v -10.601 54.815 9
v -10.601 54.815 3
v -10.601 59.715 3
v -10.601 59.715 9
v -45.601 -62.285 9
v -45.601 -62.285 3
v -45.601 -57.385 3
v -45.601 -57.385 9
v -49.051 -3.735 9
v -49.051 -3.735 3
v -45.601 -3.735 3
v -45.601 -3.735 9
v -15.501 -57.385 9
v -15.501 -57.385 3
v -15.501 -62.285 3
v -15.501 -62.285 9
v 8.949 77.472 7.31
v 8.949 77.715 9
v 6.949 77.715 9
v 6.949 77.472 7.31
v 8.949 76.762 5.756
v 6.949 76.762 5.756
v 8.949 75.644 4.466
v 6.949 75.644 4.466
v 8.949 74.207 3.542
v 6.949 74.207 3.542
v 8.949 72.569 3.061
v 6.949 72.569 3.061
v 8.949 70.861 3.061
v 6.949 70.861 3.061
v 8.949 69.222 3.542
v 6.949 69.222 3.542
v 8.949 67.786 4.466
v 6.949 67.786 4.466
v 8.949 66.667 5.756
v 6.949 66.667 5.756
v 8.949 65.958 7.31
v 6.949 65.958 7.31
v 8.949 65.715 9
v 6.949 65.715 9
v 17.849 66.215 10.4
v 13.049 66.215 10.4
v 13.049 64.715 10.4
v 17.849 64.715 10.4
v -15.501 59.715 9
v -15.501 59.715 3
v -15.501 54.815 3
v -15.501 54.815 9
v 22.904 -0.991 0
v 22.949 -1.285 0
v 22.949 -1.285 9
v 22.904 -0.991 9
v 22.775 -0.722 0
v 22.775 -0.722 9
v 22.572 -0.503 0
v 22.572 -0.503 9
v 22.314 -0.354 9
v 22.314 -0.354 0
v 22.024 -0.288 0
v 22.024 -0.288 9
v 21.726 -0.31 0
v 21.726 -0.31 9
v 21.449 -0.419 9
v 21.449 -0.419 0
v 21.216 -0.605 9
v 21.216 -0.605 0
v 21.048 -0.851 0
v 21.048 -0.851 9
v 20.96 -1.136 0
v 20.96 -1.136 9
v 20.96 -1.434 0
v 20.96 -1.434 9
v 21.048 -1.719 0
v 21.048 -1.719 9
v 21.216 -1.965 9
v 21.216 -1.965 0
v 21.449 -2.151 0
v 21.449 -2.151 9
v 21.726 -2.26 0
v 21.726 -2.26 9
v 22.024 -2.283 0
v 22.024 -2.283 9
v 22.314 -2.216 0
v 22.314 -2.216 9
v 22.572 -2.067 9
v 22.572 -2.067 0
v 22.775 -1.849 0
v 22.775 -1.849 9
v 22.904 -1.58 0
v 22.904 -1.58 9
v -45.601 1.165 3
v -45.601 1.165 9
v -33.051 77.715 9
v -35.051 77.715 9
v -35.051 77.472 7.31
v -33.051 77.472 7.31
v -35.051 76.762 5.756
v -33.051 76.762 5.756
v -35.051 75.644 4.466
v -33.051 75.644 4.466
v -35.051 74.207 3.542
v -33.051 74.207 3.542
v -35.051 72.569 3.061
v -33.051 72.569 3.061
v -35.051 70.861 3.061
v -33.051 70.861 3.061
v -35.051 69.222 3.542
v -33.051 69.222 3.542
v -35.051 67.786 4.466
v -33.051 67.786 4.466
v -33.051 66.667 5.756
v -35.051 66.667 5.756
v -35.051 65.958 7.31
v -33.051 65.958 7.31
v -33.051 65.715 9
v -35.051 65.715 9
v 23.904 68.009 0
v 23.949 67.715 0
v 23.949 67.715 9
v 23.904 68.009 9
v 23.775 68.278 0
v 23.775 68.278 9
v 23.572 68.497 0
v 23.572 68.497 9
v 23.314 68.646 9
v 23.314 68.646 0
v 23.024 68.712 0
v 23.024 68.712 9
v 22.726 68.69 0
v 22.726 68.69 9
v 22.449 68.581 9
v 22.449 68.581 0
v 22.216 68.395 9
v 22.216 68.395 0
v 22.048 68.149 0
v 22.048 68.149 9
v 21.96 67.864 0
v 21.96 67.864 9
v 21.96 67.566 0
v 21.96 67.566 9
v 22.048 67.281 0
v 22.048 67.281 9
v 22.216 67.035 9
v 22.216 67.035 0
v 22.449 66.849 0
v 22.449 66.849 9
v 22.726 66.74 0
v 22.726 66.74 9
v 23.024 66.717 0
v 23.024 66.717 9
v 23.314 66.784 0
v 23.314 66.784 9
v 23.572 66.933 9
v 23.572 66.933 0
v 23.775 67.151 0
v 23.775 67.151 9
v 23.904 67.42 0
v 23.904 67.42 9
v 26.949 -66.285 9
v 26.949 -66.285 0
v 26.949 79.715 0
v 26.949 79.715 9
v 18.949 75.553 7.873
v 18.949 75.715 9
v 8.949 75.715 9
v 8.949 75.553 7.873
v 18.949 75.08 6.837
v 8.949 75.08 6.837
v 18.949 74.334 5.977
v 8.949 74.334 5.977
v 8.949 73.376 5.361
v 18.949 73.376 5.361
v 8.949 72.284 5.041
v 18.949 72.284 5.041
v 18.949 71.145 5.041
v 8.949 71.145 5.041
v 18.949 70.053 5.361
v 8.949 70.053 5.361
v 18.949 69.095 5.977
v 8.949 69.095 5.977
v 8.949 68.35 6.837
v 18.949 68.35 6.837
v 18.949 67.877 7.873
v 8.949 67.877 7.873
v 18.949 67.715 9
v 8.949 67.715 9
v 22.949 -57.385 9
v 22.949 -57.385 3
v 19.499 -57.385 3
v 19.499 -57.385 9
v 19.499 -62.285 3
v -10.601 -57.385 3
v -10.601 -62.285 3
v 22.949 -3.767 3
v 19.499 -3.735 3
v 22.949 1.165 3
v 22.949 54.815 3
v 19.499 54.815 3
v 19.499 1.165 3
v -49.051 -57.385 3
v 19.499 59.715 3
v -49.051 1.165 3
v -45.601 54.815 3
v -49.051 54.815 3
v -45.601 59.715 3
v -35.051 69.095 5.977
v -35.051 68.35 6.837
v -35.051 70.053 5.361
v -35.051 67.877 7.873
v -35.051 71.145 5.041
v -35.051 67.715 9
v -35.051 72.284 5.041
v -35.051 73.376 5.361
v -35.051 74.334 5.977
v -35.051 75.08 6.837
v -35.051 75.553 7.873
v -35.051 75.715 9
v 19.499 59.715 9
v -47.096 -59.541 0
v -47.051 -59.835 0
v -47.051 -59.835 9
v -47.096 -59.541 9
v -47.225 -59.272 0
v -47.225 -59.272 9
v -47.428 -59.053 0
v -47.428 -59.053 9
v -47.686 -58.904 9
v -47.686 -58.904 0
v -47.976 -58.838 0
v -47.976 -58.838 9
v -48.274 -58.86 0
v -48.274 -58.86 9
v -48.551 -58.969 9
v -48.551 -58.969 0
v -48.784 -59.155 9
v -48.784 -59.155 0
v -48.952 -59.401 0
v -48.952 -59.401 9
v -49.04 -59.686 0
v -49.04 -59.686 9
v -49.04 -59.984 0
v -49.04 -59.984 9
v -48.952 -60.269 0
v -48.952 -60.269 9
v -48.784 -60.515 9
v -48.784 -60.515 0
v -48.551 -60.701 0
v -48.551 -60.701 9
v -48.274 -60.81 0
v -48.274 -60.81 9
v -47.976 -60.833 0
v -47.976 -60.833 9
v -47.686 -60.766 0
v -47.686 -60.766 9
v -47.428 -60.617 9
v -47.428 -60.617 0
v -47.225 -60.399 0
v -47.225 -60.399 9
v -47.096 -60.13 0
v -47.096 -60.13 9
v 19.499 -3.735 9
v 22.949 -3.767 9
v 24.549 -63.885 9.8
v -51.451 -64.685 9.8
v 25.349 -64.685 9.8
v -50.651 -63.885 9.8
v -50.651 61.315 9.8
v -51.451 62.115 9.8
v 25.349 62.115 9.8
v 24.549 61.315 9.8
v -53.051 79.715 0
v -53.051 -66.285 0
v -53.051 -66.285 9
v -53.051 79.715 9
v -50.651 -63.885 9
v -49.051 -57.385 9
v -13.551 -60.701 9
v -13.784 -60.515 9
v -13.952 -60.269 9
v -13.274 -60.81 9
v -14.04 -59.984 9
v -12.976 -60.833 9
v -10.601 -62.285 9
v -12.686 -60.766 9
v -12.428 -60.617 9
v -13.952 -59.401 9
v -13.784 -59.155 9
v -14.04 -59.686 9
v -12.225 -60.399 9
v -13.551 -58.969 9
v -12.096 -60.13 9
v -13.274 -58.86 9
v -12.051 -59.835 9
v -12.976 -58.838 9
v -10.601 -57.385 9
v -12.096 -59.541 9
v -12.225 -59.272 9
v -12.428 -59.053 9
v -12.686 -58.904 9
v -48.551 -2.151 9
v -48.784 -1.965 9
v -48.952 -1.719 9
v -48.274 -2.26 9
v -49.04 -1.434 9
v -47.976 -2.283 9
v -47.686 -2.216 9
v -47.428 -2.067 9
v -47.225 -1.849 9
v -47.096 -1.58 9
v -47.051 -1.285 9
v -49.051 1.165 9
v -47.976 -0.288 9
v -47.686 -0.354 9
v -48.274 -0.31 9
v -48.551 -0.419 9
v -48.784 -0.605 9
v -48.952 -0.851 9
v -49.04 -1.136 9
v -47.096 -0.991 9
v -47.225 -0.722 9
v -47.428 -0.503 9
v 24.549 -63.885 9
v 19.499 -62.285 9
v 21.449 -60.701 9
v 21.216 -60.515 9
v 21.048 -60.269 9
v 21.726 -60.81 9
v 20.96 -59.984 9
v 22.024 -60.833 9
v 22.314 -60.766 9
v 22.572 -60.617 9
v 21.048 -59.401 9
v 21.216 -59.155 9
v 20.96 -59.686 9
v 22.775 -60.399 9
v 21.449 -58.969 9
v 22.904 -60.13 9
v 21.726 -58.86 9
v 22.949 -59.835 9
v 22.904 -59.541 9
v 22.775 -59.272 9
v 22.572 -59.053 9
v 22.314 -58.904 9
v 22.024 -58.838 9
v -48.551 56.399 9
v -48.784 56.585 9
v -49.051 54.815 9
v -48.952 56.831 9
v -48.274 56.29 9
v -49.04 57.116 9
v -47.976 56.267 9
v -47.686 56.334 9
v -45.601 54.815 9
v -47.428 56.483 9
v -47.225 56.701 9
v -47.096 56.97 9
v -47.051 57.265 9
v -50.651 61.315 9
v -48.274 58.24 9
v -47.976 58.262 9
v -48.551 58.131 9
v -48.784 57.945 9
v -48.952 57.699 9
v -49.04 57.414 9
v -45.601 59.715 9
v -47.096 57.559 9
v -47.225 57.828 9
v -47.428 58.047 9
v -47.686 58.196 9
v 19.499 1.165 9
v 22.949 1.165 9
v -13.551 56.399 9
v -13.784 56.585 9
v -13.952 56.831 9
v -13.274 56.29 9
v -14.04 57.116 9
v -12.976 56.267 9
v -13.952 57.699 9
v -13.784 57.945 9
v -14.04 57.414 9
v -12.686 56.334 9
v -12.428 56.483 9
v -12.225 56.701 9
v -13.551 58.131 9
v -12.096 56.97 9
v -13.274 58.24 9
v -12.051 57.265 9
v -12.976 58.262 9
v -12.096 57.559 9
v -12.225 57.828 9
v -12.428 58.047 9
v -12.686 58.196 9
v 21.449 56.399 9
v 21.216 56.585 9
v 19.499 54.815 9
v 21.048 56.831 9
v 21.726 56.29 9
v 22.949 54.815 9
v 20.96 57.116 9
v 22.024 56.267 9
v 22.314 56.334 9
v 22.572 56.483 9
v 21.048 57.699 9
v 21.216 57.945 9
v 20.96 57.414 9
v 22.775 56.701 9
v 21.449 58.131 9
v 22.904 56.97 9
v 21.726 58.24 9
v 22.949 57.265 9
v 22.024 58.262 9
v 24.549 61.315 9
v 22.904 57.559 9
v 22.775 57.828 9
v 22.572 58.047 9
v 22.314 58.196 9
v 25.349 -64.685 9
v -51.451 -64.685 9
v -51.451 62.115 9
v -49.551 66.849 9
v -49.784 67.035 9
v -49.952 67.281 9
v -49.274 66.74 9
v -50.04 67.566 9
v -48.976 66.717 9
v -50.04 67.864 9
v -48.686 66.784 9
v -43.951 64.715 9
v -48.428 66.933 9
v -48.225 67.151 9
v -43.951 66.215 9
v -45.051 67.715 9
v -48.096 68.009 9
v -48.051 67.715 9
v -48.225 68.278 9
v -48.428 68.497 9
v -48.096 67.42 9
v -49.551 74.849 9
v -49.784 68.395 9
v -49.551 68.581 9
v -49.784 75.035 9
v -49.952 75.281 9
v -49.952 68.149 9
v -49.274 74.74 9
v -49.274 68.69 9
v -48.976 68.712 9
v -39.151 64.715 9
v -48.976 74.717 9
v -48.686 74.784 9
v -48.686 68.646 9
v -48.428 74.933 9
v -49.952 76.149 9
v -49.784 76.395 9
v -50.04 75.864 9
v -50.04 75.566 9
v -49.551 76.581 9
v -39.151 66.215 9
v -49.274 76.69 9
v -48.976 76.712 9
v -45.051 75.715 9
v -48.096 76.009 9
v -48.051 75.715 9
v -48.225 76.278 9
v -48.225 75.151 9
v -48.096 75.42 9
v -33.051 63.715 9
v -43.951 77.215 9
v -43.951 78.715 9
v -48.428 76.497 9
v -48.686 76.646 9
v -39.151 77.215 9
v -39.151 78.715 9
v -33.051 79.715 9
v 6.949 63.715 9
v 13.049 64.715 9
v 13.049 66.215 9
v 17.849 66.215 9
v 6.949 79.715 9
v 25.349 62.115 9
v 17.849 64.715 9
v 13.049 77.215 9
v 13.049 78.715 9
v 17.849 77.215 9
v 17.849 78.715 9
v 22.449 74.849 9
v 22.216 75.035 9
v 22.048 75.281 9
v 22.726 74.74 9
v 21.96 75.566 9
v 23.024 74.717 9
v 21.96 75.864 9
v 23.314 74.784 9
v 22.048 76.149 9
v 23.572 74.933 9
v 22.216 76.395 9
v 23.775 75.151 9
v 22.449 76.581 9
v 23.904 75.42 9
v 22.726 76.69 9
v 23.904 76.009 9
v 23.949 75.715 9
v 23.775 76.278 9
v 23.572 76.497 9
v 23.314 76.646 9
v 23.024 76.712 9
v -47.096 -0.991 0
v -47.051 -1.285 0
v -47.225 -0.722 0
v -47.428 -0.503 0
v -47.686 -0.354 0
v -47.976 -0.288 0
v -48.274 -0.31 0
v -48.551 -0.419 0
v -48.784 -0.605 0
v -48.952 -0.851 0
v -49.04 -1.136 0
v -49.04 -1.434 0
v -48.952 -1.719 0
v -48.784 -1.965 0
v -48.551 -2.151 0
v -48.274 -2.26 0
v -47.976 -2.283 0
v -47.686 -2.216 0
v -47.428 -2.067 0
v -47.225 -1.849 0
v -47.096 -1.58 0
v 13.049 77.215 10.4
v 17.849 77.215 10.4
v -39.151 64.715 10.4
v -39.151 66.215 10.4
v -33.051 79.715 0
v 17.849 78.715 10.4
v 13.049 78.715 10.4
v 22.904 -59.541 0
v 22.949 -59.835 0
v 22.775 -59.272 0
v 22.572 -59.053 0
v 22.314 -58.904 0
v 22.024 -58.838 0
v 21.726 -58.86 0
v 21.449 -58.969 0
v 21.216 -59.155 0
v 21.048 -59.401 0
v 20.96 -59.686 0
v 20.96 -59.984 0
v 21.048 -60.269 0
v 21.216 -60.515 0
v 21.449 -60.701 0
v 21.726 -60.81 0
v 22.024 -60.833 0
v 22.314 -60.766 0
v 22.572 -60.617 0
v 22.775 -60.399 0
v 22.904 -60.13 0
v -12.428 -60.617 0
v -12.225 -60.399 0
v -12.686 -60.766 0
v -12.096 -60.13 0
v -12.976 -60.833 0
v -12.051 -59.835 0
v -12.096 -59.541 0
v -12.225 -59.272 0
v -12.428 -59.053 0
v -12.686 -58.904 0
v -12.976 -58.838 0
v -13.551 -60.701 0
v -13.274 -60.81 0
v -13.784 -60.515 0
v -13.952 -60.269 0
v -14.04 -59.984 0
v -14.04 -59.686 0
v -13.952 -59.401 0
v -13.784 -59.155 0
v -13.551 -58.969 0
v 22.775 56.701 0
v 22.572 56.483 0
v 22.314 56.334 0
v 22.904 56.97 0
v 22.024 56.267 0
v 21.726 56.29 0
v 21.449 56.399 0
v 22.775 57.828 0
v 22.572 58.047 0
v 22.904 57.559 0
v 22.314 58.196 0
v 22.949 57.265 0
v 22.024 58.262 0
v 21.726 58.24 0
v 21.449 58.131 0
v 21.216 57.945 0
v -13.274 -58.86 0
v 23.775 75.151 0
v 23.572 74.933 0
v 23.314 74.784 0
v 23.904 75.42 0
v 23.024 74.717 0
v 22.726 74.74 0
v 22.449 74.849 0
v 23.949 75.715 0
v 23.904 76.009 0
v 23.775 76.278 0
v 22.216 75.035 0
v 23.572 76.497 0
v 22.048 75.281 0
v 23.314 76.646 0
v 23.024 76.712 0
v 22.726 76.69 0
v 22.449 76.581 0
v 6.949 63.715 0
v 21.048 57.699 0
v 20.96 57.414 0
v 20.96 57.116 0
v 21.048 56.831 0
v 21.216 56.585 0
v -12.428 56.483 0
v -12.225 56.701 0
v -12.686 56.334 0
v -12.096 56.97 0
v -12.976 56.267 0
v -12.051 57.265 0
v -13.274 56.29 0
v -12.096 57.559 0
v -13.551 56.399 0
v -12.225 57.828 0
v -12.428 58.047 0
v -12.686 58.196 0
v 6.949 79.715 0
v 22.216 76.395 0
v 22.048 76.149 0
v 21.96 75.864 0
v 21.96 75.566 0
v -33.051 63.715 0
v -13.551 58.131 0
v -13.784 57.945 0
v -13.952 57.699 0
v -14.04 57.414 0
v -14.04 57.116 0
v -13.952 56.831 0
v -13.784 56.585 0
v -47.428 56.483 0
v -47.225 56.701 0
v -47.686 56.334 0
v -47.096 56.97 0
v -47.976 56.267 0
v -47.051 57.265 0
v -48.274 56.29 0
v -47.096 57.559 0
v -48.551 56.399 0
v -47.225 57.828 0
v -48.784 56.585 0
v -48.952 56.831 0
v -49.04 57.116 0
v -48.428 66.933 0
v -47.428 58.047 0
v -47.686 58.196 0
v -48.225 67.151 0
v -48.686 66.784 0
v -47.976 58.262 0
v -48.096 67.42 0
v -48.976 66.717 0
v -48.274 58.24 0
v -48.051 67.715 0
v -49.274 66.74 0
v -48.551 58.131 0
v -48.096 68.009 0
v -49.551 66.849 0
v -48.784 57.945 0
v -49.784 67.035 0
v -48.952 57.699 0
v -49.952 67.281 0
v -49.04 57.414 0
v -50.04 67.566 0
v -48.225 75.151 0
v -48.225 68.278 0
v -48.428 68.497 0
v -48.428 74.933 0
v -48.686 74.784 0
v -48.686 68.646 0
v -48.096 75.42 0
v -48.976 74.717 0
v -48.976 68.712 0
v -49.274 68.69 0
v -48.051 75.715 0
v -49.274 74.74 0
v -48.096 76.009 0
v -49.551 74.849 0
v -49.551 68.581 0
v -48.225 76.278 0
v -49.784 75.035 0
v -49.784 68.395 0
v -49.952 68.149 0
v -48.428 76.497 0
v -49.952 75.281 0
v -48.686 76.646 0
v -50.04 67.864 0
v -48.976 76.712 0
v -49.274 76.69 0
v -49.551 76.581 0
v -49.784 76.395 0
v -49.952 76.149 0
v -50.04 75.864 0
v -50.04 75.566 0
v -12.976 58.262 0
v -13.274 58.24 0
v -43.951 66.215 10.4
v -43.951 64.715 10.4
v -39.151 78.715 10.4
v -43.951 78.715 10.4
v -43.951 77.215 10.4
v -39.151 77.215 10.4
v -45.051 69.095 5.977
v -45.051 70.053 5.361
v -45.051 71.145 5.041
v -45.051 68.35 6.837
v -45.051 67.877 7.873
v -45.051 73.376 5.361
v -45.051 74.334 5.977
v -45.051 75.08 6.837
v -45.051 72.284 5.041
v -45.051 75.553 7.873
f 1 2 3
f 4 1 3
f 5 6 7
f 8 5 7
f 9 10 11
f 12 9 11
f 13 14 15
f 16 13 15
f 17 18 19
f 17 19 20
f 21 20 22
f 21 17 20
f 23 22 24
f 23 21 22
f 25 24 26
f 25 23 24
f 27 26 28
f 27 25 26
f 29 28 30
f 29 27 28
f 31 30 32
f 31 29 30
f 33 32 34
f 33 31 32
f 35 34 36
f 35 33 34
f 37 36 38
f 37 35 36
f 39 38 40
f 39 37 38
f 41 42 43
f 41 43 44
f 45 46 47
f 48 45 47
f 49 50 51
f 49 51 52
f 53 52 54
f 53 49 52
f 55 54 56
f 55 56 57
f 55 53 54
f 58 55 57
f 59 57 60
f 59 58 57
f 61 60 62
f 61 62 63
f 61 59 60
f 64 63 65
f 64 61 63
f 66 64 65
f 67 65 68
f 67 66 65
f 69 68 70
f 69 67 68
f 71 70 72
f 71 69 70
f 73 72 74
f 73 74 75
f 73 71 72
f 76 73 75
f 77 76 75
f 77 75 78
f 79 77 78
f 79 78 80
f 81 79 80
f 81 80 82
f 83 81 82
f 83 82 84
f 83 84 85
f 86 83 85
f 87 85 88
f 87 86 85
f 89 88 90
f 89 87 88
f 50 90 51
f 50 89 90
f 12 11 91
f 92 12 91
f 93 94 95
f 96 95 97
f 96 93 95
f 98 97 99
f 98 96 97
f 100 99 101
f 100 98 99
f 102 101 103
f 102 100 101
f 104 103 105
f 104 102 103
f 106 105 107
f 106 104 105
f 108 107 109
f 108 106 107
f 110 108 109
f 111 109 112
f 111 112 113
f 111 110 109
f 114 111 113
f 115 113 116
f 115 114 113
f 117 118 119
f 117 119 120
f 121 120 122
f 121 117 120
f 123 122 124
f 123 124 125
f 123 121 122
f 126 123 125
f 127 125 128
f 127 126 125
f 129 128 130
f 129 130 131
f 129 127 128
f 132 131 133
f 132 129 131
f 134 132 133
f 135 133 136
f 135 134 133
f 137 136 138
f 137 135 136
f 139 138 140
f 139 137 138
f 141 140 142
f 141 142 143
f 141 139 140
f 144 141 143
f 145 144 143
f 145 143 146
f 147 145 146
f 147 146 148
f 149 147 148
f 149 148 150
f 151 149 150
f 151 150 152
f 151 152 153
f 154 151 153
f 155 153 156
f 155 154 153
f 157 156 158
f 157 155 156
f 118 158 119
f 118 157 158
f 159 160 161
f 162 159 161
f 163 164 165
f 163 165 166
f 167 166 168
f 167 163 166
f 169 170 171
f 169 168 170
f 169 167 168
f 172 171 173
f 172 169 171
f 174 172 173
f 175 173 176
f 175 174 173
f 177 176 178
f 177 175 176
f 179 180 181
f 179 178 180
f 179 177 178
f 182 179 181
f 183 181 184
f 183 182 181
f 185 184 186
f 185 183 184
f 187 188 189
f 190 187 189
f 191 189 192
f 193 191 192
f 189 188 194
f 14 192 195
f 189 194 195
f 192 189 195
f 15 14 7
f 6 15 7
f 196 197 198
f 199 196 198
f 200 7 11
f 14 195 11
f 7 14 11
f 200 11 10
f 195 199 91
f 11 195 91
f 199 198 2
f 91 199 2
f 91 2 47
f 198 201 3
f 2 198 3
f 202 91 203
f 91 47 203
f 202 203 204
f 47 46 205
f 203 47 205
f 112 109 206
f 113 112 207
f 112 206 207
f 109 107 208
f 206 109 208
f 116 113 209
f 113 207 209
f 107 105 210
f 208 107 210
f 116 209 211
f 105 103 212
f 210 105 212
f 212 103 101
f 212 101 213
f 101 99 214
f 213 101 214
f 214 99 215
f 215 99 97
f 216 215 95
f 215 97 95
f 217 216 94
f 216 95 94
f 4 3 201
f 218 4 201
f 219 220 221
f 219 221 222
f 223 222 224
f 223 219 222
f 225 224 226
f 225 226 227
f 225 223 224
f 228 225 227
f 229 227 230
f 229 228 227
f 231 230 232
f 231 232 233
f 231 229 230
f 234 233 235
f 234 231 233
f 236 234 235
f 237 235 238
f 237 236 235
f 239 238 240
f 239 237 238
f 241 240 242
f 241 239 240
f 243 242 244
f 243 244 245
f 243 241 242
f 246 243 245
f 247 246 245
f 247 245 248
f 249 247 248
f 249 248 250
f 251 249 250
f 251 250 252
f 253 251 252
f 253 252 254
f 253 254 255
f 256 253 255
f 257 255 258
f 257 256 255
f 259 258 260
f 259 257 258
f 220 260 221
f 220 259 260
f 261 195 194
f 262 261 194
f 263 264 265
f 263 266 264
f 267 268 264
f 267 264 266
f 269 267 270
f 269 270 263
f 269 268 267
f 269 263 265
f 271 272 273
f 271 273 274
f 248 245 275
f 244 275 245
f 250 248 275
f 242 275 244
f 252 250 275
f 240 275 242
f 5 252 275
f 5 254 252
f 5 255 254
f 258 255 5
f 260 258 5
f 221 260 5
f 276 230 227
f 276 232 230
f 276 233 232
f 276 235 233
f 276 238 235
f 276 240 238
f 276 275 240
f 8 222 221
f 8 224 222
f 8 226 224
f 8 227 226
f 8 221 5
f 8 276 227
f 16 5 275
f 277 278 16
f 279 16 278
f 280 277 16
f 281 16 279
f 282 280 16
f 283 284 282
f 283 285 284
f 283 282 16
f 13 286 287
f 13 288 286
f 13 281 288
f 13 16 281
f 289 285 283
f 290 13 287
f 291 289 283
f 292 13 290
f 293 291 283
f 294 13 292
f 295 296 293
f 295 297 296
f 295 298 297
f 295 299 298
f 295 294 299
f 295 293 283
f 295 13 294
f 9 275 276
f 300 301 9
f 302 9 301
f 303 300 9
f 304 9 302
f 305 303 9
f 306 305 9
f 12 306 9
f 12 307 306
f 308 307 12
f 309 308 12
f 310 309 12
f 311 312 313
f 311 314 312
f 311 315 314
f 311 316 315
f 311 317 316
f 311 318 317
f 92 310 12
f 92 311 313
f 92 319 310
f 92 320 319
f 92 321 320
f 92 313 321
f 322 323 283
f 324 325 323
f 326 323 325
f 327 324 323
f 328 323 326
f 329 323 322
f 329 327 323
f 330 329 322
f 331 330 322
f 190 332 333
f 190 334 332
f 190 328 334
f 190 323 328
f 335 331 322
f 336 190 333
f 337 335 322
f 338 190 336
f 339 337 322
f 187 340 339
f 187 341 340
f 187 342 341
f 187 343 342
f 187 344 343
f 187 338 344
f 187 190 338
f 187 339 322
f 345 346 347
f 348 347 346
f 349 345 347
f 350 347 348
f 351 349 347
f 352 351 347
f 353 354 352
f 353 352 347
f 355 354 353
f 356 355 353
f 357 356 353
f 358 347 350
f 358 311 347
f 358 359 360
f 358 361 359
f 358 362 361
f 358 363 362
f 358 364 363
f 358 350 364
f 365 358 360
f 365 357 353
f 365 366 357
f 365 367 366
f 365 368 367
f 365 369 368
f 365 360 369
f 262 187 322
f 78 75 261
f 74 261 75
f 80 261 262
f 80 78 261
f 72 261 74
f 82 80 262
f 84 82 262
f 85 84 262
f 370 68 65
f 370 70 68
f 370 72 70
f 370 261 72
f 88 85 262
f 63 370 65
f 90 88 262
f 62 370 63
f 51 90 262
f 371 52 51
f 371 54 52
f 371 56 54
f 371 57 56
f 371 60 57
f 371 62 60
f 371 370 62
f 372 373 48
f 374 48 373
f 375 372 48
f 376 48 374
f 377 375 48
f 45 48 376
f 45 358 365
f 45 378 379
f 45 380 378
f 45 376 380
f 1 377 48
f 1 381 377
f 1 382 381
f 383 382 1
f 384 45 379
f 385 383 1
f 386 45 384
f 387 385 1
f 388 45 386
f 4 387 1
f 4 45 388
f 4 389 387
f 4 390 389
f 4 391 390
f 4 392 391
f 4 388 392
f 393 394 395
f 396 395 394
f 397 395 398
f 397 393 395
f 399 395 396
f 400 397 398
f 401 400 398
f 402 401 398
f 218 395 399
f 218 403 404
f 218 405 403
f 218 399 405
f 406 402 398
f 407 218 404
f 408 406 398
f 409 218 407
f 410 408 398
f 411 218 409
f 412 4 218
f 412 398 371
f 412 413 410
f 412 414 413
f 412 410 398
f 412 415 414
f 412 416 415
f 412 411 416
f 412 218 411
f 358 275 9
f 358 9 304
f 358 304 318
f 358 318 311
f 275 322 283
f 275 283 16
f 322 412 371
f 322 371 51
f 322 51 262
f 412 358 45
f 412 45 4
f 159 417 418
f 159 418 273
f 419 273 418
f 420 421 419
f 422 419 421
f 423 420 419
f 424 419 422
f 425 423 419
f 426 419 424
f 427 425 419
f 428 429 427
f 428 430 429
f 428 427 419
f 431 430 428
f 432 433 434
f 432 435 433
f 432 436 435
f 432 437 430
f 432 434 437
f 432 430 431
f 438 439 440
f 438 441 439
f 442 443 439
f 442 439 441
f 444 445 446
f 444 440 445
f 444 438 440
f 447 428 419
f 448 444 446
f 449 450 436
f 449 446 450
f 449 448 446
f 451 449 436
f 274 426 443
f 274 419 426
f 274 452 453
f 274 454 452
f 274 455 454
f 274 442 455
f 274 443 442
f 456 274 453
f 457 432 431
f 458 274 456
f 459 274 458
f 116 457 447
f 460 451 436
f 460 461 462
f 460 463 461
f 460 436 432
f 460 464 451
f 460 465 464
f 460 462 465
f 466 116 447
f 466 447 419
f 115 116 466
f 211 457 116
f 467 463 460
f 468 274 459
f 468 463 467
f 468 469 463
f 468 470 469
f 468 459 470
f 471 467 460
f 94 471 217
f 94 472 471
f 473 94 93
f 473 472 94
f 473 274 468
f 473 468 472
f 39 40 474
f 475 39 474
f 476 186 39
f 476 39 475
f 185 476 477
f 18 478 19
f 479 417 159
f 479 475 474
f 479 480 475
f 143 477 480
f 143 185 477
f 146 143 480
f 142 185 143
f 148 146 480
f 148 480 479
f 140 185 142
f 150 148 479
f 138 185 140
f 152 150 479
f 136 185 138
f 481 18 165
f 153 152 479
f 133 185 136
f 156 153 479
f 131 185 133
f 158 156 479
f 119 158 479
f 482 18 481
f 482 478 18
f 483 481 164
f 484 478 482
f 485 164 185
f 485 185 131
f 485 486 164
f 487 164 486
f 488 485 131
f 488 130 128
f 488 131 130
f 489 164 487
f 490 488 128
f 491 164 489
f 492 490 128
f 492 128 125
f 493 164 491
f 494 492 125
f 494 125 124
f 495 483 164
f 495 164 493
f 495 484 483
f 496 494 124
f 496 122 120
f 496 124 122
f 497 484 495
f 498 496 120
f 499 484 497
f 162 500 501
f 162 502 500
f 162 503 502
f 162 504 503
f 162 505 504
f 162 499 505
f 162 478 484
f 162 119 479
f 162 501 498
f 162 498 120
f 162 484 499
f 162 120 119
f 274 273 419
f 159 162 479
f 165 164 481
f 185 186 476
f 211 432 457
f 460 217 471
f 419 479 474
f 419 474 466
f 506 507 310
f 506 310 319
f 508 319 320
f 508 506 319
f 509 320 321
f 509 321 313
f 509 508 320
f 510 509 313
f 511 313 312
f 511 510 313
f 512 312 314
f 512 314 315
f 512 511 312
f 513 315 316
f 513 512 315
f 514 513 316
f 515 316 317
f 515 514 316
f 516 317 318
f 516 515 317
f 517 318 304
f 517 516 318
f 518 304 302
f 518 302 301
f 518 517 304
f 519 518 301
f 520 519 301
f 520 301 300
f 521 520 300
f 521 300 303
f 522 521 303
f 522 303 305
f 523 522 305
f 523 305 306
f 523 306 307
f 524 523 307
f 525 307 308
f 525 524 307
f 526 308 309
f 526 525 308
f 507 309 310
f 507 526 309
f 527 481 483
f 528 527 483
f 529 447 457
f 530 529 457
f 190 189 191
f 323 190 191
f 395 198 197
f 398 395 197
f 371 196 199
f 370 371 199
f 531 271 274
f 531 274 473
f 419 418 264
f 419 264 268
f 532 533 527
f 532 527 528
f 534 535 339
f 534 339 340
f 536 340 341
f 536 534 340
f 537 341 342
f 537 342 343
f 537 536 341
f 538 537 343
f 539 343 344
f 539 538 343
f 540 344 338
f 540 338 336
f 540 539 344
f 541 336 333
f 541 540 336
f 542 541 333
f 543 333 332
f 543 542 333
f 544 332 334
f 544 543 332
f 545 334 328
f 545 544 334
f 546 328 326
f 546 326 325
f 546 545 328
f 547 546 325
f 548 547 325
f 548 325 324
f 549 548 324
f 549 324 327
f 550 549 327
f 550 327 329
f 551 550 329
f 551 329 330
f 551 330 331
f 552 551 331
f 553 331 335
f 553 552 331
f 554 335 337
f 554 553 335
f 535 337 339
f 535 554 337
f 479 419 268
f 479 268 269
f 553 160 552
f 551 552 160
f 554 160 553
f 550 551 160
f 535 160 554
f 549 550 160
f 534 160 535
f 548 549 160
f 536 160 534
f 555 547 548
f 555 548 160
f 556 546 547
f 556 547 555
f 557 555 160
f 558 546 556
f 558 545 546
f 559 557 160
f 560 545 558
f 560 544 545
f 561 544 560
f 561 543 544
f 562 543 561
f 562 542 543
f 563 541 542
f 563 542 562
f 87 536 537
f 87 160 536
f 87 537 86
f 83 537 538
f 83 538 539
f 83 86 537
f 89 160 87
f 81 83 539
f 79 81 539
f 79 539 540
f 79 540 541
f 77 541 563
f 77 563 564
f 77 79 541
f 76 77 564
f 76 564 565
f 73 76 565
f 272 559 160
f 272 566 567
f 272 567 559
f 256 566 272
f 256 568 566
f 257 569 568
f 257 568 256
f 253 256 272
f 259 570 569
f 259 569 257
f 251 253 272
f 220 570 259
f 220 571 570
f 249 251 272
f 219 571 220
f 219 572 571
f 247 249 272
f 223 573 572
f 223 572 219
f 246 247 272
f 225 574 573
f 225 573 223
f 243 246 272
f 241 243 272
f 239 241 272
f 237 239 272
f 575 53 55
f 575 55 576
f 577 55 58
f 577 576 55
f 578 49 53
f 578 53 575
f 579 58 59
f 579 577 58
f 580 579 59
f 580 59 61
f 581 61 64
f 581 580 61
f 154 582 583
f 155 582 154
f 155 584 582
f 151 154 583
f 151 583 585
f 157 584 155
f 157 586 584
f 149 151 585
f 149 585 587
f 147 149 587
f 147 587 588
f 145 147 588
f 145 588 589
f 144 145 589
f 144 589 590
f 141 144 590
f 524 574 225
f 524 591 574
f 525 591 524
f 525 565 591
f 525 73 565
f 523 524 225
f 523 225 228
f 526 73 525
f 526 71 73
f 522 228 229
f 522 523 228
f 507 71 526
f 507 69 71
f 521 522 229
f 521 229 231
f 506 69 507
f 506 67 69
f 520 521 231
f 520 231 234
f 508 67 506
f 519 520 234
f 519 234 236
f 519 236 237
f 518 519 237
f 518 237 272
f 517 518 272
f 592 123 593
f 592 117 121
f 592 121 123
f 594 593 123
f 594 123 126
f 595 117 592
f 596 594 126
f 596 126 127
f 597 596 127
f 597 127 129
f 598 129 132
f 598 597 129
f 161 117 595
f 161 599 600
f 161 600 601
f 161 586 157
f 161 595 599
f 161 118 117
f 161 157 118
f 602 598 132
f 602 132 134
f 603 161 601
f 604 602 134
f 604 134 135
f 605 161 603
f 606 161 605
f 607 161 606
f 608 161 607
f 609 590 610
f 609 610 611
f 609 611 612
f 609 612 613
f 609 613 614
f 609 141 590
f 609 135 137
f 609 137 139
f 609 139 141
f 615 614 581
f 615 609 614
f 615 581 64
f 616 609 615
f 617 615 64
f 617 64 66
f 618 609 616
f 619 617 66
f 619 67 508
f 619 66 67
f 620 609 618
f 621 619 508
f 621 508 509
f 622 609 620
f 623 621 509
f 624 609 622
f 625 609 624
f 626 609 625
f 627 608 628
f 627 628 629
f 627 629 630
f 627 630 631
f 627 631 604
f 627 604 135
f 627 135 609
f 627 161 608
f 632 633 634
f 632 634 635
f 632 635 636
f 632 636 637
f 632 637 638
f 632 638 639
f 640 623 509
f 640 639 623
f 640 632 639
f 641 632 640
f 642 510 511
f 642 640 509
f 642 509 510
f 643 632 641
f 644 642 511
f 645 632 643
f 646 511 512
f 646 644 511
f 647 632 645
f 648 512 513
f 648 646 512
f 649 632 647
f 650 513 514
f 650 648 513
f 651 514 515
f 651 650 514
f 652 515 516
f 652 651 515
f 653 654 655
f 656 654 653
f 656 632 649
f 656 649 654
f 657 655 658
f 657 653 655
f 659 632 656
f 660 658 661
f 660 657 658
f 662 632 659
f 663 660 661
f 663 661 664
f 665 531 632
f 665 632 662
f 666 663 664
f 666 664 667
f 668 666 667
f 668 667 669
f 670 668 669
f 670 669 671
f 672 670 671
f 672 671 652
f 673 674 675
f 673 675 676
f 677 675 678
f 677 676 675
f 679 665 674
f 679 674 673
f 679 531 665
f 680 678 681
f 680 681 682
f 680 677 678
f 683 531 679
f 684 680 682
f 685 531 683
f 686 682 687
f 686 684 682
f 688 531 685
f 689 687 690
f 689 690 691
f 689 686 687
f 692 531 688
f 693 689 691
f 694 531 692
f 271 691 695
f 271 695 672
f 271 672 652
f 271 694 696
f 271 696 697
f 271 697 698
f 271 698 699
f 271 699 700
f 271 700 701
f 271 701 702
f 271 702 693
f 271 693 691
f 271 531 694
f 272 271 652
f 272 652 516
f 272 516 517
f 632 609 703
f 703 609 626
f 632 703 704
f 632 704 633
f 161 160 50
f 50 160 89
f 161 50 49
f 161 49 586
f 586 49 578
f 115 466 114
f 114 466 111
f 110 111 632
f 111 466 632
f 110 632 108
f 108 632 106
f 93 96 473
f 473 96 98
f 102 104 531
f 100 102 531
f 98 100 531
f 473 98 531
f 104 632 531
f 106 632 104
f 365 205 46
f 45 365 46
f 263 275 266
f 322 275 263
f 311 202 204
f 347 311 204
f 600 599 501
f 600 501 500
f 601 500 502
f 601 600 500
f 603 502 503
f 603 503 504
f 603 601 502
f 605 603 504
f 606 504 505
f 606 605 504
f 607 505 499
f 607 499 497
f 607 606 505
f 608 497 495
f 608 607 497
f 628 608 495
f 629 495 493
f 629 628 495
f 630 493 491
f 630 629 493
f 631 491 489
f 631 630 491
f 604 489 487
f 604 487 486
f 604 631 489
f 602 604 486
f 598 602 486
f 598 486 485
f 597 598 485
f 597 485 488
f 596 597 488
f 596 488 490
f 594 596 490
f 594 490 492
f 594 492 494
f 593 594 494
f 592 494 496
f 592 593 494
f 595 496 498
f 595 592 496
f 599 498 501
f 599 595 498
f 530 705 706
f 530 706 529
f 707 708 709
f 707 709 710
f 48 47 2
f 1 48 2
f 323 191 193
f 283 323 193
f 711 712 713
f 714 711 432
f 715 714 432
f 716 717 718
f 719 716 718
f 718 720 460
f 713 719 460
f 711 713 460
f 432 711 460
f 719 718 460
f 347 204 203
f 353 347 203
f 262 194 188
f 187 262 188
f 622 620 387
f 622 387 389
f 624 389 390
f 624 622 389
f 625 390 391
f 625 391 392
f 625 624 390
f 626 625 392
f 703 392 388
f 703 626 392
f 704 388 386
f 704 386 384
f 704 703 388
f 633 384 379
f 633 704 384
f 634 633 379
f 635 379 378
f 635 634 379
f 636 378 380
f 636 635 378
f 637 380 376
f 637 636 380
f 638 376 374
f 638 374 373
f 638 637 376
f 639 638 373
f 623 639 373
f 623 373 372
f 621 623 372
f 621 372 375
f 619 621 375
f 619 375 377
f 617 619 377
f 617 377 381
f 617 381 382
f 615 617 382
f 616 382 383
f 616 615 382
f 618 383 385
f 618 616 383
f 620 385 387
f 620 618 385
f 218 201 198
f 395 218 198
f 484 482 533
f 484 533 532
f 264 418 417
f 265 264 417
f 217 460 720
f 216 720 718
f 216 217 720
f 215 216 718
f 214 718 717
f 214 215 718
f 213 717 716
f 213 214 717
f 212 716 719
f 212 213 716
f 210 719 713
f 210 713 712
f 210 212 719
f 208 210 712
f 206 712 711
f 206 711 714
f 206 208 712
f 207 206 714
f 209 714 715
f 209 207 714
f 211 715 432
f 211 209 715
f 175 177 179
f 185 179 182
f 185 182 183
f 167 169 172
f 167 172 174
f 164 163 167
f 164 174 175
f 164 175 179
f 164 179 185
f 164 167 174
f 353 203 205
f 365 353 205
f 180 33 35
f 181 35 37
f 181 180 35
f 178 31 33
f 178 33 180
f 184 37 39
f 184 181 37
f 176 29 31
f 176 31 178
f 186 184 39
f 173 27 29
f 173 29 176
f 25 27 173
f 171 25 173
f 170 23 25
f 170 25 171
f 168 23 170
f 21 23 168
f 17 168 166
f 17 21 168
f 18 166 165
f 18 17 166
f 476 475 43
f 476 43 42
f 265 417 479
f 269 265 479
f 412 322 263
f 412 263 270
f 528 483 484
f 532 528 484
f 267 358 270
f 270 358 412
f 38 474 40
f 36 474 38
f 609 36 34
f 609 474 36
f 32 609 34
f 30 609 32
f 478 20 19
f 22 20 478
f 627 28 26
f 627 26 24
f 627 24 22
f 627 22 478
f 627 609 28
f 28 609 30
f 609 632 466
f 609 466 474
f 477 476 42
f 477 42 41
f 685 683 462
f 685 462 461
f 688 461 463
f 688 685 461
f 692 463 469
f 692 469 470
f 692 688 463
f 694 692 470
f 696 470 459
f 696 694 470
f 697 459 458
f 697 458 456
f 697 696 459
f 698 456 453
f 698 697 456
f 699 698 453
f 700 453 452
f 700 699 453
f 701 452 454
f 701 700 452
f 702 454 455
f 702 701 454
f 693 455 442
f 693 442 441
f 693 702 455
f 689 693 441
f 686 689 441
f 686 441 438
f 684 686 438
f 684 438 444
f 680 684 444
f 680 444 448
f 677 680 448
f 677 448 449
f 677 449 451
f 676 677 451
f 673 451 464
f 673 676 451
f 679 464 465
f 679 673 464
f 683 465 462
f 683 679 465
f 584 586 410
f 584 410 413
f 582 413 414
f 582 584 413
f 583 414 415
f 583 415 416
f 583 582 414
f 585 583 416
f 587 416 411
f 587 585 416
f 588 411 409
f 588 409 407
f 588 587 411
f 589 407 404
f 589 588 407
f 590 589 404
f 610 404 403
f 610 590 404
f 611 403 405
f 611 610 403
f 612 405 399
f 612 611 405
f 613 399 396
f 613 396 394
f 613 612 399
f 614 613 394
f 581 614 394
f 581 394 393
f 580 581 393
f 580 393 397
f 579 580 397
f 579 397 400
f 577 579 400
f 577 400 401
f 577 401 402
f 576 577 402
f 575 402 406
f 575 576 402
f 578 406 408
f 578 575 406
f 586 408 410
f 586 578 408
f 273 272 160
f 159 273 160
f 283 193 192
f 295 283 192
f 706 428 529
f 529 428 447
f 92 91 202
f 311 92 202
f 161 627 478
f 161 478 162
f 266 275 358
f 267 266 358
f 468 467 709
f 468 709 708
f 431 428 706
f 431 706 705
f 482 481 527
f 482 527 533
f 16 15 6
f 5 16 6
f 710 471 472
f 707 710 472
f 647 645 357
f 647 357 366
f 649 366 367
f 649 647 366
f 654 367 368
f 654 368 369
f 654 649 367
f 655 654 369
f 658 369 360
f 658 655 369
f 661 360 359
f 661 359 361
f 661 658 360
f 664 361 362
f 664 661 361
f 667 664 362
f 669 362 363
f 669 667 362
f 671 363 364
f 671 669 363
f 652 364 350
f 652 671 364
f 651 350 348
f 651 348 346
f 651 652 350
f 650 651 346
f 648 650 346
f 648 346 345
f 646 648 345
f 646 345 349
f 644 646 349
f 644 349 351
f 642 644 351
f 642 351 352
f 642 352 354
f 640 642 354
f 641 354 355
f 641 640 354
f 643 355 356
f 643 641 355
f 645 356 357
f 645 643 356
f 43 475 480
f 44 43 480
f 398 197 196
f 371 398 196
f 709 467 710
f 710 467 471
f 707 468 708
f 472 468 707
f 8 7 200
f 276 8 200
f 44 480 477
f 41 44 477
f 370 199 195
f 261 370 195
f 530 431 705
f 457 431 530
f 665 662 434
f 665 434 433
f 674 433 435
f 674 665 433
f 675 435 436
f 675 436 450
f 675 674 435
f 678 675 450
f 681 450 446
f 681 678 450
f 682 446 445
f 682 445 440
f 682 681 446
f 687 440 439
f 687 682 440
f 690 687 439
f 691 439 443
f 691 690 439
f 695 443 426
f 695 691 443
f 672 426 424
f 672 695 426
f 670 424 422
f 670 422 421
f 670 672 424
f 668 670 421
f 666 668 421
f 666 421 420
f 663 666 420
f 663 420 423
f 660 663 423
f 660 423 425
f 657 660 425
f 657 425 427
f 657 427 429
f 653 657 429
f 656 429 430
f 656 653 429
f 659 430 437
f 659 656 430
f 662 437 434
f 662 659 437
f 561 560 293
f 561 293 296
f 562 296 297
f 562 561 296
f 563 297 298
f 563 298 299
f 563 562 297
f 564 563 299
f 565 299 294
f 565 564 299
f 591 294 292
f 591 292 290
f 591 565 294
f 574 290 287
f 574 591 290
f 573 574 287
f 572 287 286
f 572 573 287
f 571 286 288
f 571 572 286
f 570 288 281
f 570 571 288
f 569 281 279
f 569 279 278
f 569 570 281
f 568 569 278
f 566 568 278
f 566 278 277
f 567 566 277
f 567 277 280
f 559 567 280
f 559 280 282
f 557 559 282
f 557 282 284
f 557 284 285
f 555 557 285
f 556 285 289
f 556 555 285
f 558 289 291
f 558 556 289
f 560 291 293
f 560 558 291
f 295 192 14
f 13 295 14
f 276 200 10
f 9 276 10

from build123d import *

# Parameters (mm, degrees)
IZIM1_R                       = 1
IZIM1_W                       = 4.8
IZIM1_H                       = 1.5
IZIM1_W_2                     = 76.8
IZIM1_H_2                     = 126.8
Y_KSEKLIK_EKSTR_ZYON1_DEPTH   = 9
IZIM1_W_3                     = 75.2
IZIM1_H_3                     = 125.2
Y_KSEKLIK_EKSTR_ZYON1_2_DEPTH = 9
IZIM1_3_W                     = 4.8
IZIM1_3_H                     = 1.5
Y_KSEKLIK_EKSTR_ZYON2_DEPTH   = 10.4
IZIM1_4_W                     = 76.8
IZIM1_4_H                     = 126.8
IZIM1_4_W_2                   = 75.2
IZIM1_4_H_2                   = 125.2
Y_KSEKLIK_EKSTR_ZYON3_DEPTH   = 9.8
Y_KSEKLIK_EKSTR_ZYON4_DEPTH   = 3
KES_EKSTR_ZYON1_DEPTH         = 52
KES_EKSTR_ZYON1_DEPTH_BACK    = 12
KES_EKSTR_ZYON2_DEPTH         = 42
KES_EKSTR_ZYON2_DEPTH_BACK    = 2


with BuildPart() as part:
    # Çizim1 → Yükseklik-Ekstrüzyon1 (new body)
    with BuildSketch(Plane.XY):
        Polygon((-33.05110417, 63.714698522), (-33.05110417, 79.714698522), (-53.05110417, 79.714698522), (-53.05110417, -66.285301478), (26.94889583, -66.285301478), (26.94889583, 79.714698522), (6.94889583, 79.714698522), (6.94889583, 63.714698522), align=None)
        with Locations((-49.05110417, 67.714698522)):
            Circle(IZIM1_R, mode=Mode.SUBTRACT)
        with Locations((-49.05110417, 75.714698522)):
            Circle(IZIM1_R, mode=Mode.SUBTRACT)
        with Locations((-41.55110417, 65.464698522)):
            Rectangle(IZIM1_W, IZIM1_H, mode=Mode.SUBTRACT)
        with Locations((-41.55110417, 77.964698522)):
            Rectangle(IZIM1_W, IZIM1_H, mode=Mode.SUBTRACT)
        with Locations((-13.05110417, -1.285301478)):
            Rectangle(IZIM1_W_2, IZIM1_H_2, mode=Mode.SUBTRACT)
        with Locations((22.94889583, 75.714698522)):
            Circle(IZIM1_R, mode=Mode.SUBTRACT)
        with Locations((15.44889583, 65.464698522)):
            Rectangle(IZIM1_W, IZIM1_H, mode=Mode.SUBTRACT)
        with Locations((15.44889583, 77.964698522)):
            Rectangle(IZIM1_W, IZIM1_H, mode=Mode.SUBTRACT)
        with Locations((22.94889583, 67.714698522)):
            Circle(IZIM1_R, mode=Mode.SUBTRACT)
    extrude(amount=Y_KSEKLIK_EKSTR_ZYON1_DEPTH)

    # Çizim1<3> → Yükseklik-Ekstrüzyon2 (add)
    with BuildSketch(Plane.XY):
        with Locations((15.44889583, 65.464698522)):
            Rectangle(IZIM1_3_W, IZIM1_3_H)
        with Locations((15.44889583, 77.964698522)):
            Rectangle(IZIM1_3_W, IZIM1_3_H)
        with Locations((-41.55110417, 77.964698522)):
            Rectangle(IZIM1_3_W, IZIM1_3_H)
        with Locations((-41.55110417, 65.464698522)):
            Rectangle(IZIM1_3_W, IZIM1_3_H)
    extrude(amount=Y_KSEKLIK_EKSTR_ZYON2_DEPTH)



with BuildPart() as body_2:
    # Çizim1 → Y_kseklik-Ekstr_zyon1 2 (new body)
    with BuildSketch(Plane.XY):
        with Locations((-13.05110417, -1.285301478)):
            Rectangle(IZIM1_W_3, IZIM1_H_3)
        with Locations((-48.05110417, -59.835301478)):
            Circle(IZIM1_R, mode=Mode.SUBTRACT)
        with Locations((-48.05110417, -1.285301478)):
            Circle(IZIM1_R, mode=Mode.SUBTRACT)
        with Locations((-13.05110417, -59.835301478)):
            Circle(IZIM1_R, mode=Mode.SUBTRACT)
        with Locations((21.94889583, -59.835301478)):
            Circle(IZIM1_R, mode=Mode.SUBTRACT)
        Polygon((-49.05110417, 54.814698522), (-45.60110417, 54.814698522), (-45.60110417, 59.714698522), (-15.50110417, 59.714698522), (-15.50110417, 54.814698522), (-10.60110417, 54.814698522), (-10.60110417, 59.714698522), (19.49889583, 59.714698522), (19.49889583, 54.814698522), (22.94889583, 54.814698522), (22.94889583, 1.164698522), (19.49889583, 1.164698522), (19.49889583, -3.735301478), (22.94889583, -3.766968147), (22.94889583, -57.385301478), (19.49889583, -57.385301478), (19.49889583, -62.285301478), (-10.60110417, -62.285301478), (-10.60110417, -57.385301478), (-15.50110417, -57.385301478), (-15.50110417, -62.285301478), (-45.60110417, -62.285301478), (-45.60110417, -57.385301478), (-49.05110417, -57.385301478), (-49.05110417, -3.735301478), (-45.60110417, -3.735301478), (-45.60110417, 1.164698522), (-49.05110417, 1.164698522), align=None, mode=Mode.SUBTRACT)
        with Locations((21.94889583, -1.285301478)):
            Circle(IZIM1_R, mode=Mode.SUBTRACT)
        with Locations((-48.05110417, 57.264698522)):
            Circle(IZIM1_R, mode=Mode.SUBTRACT)
        with Locations((-13.05110417, 57.264698522)):
            Circle(IZIM1_R, mode=Mode.SUBTRACT)
        with Locations((21.94889583, 57.264698522)):
            Circle(IZIM1_R, mode=Mode.SUBTRACT)
    extrude(amount=Y_KSEKLIK_EKSTR_ZYON1_2_DEPTH)


with BuildPart() as part_1:
    add(part.part)

    add(body_2.part)  # Yükseklik-Ekstrüzyon3 merges body 2
    # Çizim1<4> → Yükseklik-Ekstrüzyon3 (add)
    with BuildSketch(Plane.XY):
        with Locations((-13.05110417, -1.285301478)):
            Rectangle(IZIM1_4_W, IZIM1_4_H)
        with Locations((-13.05110417, -1.285301478)):
            Rectangle(IZIM1_4_W_2, IZIM1_4_H_2, mode=Mode.SUBTRACT)
    extrude(amount=Y_KSEKLIK_EKSTR_ZYON3_DEPTH)

    # Çizim1<5> → Yükseklik-Ekstrüzyon4 (add)
    with BuildSketch(Plane.XY):
        Polygon((-45.60110417, 59.714698522), (-45.60110417, 54.814698522), (-49.05110417, 54.814698522), (-49.05110417, 1.164698522), (-45.60110417, 1.164698522), (-45.60110417, -3.735301478), (-49.05110417, -3.735301478), (-49.05110417, -57.385301478), (-45.60110417, -57.385301478), (-45.60110417, -62.285301478), (-15.50110417, -62.285301478), (-15.50110417, -57.385301478), (-10.60110417, -57.385301478), (-10.60110417, -62.285301478), (19.49889583, -62.285301478), (19.49889583, -57.385301478), (22.94889583, -57.385301478), (22.94889583, -3.766968147), (19.49889583, -3.735301478), (19.49889583, 1.164698522), (22.94889583, 1.164698522), (22.94889583, 54.814698522), (19.49889583, 54.814698522), (19.49889583, 59.714698522), (-10.60110417, 59.714698522), (-10.60110417, 54.814698522), (-15.50110417, 54.814698522), (-15.50110417, 59.714698522), align=None)
    extrude(amount=Y_KSEKLIK_EKSTR_ZYON4_DEPTH)

    # Çizim2 → Kes-Ekstrüzyon1 (cut, two sides: drawn at the far end of the back side and taken through both)
    with BuildSketch(Plane.ZY.offset(-6.94889583).offset(-KES_EKSTR_ZYON1_DEPTH_BACK)):
        with BuildLine():
            Line((9, 67.714698522), (9, 75.714698522))
            ThreePointArc((9, 75.714698522), (5, 71.714698522), (9, 67.714698522))
        make_face()
    extrude(amount=KES_EKSTR_ZYON1_DEPTH + KES_EKSTR_ZYON1_DEPTH_BACK, mode=Mode.SUBTRACT)

    # Çizim2<3> → Kes-Ekstrüzyon2 (cut, two sides: drawn at the far end of the back side and taken through both)
    with BuildSketch(Plane.ZY.offset(-6.94889583).offset(-KES_EKSTR_ZYON2_DEPTH_BACK)):
        with BuildLine():
            Line((9, 75.714698522), (9, 77.714698522))
            ThreePointArc((9, 77.714698522), (3, 71.714698522), (9, 65.714698522))
            Line((9, 65.714698522), (9, 67.714698522))
            ThreePointArc((9, 67.714698522), (5, 71.714698522), (9, 75.714698522))
        make_face()
    extrude(amount=KES_EKSTR_ZYON2_DEPTH + KES_EKSTR_ZYON2_DEPTH_BACK, mode=Mode.SUBTRACT)


solid = part_1.part
